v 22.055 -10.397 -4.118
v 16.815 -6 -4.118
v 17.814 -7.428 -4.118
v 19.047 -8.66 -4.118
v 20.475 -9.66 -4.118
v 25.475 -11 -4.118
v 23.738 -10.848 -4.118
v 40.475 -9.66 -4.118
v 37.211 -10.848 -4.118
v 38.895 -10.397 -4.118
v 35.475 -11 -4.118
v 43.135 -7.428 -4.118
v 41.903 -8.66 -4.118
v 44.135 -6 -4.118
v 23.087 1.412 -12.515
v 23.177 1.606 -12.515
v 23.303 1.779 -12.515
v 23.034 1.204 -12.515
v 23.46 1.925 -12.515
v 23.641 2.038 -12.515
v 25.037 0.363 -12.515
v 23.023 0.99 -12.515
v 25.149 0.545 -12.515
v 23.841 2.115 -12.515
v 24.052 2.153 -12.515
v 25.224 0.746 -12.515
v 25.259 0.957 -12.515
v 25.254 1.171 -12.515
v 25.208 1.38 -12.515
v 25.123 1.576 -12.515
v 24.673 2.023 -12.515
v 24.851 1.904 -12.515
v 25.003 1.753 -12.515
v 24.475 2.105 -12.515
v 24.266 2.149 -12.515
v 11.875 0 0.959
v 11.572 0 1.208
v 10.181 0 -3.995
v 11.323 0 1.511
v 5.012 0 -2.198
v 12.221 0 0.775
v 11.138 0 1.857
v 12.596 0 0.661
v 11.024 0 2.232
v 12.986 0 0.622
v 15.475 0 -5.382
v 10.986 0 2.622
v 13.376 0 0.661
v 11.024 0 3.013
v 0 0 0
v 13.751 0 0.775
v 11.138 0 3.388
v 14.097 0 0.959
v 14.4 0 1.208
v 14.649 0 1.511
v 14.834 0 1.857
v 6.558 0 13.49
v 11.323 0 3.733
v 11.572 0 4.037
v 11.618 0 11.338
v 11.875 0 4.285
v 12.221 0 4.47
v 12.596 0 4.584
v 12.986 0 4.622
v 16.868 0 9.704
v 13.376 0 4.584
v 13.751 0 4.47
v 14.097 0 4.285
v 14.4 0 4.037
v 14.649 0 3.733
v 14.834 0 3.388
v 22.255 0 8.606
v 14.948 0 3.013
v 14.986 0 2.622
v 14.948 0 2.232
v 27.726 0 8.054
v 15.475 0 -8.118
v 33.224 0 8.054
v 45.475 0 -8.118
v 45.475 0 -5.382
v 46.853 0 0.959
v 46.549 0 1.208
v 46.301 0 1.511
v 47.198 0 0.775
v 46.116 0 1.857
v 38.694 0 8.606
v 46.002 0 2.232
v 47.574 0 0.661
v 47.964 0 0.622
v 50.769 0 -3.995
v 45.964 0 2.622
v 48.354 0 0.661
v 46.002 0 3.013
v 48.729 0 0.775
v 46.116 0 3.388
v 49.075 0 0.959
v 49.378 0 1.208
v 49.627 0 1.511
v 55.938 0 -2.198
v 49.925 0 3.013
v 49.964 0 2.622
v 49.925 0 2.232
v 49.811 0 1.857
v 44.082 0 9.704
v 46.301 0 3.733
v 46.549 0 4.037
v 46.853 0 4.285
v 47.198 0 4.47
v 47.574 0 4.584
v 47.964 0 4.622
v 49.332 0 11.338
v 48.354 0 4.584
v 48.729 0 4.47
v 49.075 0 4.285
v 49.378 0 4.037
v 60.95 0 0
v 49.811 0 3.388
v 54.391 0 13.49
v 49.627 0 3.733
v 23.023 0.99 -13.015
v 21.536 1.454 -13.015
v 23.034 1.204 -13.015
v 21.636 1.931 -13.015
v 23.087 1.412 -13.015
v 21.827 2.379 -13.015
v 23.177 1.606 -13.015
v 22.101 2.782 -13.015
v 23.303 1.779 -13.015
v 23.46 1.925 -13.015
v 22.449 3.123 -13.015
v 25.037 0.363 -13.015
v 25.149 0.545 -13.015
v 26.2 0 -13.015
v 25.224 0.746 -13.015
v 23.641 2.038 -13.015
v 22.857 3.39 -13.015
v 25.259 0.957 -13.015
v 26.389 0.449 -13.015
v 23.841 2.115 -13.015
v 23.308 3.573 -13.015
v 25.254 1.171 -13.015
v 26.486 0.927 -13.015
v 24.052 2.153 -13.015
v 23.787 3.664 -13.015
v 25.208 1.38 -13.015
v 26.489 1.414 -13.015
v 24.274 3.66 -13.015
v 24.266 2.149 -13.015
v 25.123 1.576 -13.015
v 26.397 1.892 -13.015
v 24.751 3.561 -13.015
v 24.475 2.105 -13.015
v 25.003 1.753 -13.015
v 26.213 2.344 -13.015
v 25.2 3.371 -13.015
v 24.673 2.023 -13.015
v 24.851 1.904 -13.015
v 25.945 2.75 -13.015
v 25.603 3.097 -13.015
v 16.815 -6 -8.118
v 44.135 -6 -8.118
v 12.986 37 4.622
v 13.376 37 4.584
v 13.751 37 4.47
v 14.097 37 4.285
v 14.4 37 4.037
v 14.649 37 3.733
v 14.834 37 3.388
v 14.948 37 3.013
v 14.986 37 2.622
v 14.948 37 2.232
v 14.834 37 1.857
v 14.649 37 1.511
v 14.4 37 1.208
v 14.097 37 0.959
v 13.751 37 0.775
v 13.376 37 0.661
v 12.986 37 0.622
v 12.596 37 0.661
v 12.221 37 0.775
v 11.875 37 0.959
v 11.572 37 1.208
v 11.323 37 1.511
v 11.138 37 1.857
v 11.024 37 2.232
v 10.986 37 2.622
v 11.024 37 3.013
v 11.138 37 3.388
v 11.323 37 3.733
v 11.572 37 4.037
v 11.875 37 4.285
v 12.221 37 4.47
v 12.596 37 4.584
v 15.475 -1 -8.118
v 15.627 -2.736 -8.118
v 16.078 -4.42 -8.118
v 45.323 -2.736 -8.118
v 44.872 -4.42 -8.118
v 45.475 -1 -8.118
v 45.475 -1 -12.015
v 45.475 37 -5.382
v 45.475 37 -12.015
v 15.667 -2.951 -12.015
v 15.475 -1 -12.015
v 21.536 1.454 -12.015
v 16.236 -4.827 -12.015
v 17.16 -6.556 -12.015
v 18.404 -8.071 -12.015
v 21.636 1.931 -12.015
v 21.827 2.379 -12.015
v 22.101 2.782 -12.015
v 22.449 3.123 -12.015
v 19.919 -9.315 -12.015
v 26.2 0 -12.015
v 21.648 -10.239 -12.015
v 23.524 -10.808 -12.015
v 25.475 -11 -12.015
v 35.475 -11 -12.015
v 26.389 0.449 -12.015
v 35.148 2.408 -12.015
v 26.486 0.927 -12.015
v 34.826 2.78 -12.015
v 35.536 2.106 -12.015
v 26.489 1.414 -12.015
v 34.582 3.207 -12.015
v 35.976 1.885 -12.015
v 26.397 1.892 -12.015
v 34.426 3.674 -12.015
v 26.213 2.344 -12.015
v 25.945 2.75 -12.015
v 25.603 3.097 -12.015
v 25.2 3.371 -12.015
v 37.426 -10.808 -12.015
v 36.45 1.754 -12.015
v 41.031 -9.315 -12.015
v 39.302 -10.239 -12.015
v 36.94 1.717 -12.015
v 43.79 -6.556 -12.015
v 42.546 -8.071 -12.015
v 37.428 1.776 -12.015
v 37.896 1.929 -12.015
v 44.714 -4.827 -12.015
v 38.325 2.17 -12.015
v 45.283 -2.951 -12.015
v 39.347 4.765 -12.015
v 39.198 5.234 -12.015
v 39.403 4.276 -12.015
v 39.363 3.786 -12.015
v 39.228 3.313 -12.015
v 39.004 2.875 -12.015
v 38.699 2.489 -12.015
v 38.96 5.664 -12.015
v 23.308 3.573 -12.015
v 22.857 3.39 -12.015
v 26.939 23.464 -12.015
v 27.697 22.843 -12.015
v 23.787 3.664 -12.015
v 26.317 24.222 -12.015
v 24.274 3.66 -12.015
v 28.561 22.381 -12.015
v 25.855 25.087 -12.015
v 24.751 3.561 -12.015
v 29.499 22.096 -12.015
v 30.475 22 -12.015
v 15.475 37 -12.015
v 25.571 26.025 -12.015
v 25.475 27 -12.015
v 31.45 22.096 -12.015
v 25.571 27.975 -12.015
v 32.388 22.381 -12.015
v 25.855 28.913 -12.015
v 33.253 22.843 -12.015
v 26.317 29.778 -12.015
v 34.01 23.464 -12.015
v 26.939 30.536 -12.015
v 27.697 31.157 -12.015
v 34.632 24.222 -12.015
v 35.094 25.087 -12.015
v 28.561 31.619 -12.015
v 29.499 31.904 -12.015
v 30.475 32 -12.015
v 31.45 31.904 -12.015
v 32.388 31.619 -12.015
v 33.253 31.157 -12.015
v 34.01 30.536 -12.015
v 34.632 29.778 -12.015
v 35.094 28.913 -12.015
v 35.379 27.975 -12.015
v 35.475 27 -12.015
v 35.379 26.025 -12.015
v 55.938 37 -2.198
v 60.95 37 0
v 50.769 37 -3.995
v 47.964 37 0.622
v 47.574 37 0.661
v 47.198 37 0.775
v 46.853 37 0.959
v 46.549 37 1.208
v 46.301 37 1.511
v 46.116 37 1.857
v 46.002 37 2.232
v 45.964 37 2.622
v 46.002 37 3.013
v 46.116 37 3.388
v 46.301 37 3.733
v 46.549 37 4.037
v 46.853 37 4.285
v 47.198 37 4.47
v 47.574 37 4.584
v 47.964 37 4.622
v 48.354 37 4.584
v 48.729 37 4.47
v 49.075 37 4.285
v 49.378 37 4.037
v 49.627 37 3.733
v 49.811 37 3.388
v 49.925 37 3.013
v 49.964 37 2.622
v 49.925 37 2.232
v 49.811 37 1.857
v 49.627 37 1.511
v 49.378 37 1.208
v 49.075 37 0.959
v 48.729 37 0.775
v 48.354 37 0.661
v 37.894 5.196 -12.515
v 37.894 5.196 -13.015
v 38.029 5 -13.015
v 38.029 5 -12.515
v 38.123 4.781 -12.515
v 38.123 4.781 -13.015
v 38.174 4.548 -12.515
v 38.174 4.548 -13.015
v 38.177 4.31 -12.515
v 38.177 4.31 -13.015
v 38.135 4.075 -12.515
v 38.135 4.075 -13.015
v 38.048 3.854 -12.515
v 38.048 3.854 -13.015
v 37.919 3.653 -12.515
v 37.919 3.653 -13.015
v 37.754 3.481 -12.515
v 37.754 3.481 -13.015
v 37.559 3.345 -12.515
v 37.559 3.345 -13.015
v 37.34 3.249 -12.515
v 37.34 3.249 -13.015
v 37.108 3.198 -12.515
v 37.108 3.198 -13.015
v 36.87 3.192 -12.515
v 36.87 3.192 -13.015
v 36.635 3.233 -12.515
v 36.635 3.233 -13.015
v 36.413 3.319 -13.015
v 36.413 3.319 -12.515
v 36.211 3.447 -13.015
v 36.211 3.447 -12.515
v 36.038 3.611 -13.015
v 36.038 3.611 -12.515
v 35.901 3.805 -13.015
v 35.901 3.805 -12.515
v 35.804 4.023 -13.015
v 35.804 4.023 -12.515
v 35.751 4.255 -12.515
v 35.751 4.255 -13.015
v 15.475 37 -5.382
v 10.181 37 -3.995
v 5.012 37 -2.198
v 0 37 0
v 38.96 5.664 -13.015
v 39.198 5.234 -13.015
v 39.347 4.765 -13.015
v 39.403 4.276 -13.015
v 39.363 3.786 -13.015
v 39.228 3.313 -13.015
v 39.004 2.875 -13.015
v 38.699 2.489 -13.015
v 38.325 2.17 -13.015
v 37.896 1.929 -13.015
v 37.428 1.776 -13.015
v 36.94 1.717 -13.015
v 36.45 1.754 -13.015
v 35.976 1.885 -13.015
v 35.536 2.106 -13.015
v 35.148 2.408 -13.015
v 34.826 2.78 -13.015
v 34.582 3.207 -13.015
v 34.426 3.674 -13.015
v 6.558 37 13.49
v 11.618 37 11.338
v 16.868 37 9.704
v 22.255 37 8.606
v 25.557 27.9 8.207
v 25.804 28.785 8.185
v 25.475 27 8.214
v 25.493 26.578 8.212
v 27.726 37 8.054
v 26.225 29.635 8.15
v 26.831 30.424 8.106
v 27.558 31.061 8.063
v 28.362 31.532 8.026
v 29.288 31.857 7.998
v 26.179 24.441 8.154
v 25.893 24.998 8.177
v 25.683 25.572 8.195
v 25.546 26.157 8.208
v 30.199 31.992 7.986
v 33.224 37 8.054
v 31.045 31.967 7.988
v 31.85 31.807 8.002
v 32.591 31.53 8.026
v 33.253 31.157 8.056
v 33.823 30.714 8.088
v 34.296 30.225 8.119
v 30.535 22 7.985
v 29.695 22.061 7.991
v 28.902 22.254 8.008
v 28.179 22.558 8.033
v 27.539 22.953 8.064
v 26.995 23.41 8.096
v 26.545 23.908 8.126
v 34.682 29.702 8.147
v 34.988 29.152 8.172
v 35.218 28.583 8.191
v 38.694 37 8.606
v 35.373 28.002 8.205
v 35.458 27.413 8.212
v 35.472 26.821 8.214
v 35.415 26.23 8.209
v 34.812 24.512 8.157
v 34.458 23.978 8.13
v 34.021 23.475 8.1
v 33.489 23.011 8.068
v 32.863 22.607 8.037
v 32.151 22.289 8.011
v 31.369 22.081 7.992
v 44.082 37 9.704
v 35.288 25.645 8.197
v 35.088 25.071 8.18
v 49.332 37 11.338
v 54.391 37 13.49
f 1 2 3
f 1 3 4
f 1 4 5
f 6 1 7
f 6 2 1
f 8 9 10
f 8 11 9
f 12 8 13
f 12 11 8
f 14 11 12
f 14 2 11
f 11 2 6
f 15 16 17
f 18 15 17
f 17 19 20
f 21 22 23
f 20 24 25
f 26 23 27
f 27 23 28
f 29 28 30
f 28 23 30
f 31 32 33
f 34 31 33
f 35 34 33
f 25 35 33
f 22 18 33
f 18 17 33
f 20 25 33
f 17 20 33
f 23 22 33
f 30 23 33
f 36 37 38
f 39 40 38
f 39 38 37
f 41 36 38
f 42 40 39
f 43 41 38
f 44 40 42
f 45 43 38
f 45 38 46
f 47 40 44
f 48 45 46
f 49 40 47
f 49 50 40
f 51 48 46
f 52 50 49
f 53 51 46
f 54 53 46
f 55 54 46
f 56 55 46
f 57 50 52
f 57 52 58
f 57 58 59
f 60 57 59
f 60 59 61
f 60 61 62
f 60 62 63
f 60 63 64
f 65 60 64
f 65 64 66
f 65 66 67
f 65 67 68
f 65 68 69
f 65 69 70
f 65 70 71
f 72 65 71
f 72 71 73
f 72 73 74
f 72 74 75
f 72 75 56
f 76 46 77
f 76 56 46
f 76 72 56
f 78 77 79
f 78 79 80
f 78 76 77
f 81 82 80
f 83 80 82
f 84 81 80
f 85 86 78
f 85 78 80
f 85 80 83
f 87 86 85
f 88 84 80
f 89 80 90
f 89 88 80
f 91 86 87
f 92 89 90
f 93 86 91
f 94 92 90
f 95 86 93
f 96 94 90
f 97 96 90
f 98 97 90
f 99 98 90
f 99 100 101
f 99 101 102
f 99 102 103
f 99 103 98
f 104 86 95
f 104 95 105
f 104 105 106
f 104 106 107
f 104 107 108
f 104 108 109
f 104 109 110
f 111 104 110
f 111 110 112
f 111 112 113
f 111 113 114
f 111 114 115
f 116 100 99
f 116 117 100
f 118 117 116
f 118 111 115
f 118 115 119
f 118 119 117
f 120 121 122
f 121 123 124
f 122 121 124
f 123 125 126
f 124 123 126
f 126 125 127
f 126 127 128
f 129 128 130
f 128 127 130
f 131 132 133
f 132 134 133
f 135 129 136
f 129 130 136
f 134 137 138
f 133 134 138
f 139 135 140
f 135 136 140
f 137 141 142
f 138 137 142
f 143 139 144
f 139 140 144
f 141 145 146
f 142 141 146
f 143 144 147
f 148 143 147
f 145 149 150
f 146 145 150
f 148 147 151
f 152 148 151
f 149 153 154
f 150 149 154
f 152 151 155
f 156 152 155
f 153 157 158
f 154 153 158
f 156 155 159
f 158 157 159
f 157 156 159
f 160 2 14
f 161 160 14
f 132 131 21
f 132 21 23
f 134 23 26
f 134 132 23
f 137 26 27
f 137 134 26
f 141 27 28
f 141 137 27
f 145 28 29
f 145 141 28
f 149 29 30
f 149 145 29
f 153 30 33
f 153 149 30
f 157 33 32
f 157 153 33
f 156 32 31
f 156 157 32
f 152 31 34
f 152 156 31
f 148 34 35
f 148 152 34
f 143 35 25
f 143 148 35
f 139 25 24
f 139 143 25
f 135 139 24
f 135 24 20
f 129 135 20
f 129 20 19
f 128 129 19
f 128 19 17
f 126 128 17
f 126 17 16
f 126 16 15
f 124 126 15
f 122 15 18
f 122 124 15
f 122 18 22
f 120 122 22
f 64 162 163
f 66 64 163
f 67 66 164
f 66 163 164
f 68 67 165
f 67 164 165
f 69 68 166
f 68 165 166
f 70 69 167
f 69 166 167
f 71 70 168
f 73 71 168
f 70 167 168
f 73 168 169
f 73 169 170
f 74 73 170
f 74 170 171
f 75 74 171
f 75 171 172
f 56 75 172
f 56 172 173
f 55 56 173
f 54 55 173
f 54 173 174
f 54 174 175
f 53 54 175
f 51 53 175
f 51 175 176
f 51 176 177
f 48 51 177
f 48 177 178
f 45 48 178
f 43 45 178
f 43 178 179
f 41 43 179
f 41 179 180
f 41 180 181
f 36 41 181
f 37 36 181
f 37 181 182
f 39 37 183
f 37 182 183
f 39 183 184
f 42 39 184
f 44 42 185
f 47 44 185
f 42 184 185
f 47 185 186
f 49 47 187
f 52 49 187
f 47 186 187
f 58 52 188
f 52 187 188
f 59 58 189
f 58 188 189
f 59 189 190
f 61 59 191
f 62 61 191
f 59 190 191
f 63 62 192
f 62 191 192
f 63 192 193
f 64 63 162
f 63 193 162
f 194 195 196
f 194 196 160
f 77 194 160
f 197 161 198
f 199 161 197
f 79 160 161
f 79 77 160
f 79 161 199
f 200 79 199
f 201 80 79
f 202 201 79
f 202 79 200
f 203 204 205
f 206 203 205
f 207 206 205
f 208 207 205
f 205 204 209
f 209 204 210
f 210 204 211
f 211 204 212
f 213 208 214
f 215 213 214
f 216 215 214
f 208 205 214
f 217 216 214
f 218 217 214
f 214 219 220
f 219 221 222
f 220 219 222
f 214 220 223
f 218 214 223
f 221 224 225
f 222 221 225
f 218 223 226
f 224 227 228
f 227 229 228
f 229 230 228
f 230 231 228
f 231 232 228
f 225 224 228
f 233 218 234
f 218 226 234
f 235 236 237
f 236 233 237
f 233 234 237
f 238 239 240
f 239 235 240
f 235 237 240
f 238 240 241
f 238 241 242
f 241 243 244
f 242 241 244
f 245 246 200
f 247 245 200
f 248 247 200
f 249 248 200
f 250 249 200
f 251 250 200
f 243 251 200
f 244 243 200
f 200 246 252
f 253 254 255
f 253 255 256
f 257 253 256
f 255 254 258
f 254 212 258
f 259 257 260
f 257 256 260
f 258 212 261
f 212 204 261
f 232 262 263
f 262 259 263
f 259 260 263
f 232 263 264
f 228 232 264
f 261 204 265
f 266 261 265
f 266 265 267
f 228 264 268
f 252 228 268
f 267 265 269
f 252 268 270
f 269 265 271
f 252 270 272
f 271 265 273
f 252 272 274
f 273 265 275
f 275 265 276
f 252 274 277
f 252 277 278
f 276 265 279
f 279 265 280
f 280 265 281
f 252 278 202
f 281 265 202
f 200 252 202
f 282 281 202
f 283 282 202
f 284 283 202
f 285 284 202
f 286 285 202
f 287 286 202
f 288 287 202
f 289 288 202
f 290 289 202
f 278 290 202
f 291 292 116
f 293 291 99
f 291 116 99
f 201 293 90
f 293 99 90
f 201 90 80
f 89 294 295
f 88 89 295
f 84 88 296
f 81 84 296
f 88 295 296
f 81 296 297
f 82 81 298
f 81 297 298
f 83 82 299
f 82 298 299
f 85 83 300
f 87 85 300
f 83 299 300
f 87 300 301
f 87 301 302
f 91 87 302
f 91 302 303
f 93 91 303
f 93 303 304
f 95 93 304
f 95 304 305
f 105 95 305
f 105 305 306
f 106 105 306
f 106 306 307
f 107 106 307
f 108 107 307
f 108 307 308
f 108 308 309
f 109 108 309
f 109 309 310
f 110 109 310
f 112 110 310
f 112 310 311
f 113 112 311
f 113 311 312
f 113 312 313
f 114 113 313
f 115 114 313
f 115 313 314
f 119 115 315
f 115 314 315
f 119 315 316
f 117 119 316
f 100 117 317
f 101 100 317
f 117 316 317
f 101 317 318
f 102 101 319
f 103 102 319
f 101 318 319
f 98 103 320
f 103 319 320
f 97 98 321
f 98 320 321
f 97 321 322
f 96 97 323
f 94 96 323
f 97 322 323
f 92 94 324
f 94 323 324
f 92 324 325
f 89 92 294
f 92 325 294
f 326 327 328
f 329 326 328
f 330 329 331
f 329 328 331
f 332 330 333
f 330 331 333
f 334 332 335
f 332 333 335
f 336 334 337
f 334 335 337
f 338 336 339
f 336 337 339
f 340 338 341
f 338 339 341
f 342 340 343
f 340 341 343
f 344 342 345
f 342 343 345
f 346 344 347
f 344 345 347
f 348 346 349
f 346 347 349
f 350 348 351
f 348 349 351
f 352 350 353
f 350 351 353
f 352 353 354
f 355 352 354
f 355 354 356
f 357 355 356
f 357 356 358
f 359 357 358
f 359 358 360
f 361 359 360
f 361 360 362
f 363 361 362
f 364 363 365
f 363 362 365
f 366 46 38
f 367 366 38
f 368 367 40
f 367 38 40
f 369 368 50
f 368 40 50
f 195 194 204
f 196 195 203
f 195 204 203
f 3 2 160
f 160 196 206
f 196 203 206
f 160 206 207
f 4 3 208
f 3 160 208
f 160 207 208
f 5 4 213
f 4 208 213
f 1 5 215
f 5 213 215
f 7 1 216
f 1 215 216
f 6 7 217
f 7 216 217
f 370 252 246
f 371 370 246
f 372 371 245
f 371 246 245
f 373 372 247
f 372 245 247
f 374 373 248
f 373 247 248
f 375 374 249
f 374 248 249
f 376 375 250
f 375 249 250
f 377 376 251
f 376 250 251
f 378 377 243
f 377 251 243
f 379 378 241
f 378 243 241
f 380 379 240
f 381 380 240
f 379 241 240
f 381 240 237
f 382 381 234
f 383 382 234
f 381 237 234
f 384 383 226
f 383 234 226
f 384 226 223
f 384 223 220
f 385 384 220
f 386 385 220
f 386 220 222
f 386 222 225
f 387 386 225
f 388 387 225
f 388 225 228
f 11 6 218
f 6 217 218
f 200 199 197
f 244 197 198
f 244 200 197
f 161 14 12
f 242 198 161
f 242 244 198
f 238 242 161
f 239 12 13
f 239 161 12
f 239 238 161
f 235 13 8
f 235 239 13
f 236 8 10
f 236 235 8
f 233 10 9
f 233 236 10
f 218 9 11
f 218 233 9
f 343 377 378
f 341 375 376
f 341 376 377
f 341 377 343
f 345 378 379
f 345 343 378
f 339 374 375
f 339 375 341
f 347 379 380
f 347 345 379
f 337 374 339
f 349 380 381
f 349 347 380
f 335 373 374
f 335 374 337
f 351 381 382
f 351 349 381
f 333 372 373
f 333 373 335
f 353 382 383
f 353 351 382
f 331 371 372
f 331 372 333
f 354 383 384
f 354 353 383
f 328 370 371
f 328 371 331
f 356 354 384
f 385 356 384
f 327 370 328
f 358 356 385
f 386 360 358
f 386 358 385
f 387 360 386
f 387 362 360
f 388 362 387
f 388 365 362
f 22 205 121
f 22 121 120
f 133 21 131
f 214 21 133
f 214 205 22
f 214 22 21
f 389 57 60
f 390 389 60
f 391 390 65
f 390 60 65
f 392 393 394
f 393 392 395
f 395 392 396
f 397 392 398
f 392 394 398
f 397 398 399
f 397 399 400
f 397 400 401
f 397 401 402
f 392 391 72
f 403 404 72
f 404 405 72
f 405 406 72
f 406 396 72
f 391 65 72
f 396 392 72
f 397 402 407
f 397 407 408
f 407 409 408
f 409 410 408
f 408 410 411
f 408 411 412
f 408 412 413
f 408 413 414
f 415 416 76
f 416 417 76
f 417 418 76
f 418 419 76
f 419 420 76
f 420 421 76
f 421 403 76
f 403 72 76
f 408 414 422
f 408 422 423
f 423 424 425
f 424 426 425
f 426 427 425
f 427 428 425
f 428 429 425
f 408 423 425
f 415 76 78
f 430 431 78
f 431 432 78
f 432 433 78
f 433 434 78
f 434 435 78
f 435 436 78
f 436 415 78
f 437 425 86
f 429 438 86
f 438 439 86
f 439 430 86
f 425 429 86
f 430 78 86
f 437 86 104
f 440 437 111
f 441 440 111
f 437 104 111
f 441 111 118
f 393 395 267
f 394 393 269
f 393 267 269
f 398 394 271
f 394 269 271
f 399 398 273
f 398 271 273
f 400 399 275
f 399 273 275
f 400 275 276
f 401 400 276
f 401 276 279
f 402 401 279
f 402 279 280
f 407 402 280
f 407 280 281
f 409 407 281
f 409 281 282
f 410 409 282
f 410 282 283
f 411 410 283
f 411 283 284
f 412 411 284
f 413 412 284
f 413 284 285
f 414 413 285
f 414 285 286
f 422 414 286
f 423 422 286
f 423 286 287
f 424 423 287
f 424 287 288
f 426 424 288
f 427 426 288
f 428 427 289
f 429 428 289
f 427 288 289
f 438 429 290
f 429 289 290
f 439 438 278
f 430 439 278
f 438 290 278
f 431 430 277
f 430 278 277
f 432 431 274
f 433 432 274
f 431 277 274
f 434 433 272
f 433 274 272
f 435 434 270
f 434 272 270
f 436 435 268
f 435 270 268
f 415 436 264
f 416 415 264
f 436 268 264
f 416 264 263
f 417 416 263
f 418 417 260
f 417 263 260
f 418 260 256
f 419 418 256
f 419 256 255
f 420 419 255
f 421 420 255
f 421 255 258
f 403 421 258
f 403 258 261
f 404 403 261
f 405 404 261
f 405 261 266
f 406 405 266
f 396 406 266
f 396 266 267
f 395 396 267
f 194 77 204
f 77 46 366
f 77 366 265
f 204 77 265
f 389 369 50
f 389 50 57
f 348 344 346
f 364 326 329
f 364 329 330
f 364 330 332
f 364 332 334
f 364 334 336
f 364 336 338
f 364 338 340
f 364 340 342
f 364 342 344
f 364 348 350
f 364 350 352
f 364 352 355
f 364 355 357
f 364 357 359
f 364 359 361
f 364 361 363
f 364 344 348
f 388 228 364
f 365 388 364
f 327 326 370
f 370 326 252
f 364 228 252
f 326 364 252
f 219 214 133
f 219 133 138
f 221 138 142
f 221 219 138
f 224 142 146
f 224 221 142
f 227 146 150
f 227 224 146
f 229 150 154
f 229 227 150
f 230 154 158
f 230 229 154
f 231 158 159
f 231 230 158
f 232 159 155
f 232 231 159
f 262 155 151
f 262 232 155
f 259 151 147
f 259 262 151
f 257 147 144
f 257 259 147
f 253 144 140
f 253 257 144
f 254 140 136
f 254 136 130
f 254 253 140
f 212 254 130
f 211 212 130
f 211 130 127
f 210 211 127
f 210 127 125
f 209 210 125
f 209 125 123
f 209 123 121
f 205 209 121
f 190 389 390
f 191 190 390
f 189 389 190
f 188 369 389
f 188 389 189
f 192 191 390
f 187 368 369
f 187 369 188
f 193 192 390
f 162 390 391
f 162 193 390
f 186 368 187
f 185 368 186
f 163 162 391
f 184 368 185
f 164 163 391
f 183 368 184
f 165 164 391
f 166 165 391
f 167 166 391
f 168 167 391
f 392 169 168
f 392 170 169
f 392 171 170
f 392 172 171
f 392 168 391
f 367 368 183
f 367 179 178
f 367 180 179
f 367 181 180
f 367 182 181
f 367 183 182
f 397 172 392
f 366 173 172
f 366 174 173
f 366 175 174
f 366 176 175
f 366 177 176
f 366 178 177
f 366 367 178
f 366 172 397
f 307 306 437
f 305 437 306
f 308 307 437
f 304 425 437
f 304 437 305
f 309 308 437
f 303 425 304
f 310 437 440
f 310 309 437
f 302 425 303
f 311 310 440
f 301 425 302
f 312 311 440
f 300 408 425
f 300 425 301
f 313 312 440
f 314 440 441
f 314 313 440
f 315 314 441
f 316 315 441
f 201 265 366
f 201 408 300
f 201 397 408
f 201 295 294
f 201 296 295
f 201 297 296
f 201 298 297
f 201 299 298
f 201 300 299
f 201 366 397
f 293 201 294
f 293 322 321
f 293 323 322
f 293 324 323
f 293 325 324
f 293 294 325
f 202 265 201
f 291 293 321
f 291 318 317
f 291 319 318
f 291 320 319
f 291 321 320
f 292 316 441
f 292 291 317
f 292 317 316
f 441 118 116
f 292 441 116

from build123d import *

# Parameters (mm, degrees)
BOSS_EXTRUDE1_DEPTH = 37
SKETCH2_R           = 2
CUT_EXTRUDE1_DEPTH  = 73.566185092
SKETCH3_W           = 30
SKETCH3_H           = 7.896551268
BOSS_EXTRUDE2_DEPTH = 48
SKETCH4_W           = 30
SKETCH4_H           = 6
CUT_EXTRUDE2_DEPTH  = 4
FILLET1_R           = 10
SKETCH5_R           = 5
CUT_EXTRUDE3_DEPTH  = 76.725712885
BOSS_EXTRUDE3_DEPTH = 1
CUT_EXTRUDE4_DEPTH  = 0.5


with BuildPart() as part:
    # Sketch1 → Boss-Extrude1 (new body)
    with BuildSketch(Plane(origin=(0, 0, 0), x_dir=(1, 0, 0), z_dir=(0, 1, 0))):
        with BuildLine():
            Line((0, 0), (6.55816832, -13.490382807))
            ThreePointArc((6.55816832, -13.490382807), (30.474828919, -7.985034321), (54.391489518, -13.490382807))
            Line((54.391489518, -13.490382807), (60.949657838, 0))
            ThreePointArc((60.949657838, 0), (30.474828919, 7.014965679), (0, 0))
        make_face()
    extrude(amount=BOSS_EXTRUDE1_DEPTH)

    # Sketch2 → Cut-Extrude1 (cut, through all)
    with BuildSketch(Plane(origin=(0, 37, 0), x_dir=(1, 0, 0), z_dir=(0, 1, 0))):
        with Locations(Location((12.985948873, -2.622359081, 0), (0, 0, 270))):
            Circle(SKETCH2_R)
        with Locations(Location((47.963708964, -2.622359081, 0), (0, 0, 90))):
            Circle(SKETCH2_R)
    extrude(amount=-CUT_EXTRUDE1_DEPTH, mode=Mode.SUBTRACT)

    # Sketch3 → Boss-Extrude2 (add)
    with BuildSketch(Plane(origin=(0, 37, 0), x_dir=(1, 0, 0), z_dir=(0, 1, 0))):
        with Locations((30.474828919, 8.066690045)):
            Rectangle(SKETCH3_W, SKETCH3_H)
    extrude(amount=-BOSS_EXTRUDE2_DEPTH)

    # Sketch4 → Cut-Extrude2 (cut)
    with BuildSketch(Plane.XY.offset(-4.118414411)):
        with Locations((30.474828919, -3)):
            Rectangle(SKETCH4_W, SKETCH4_H)
    extrude(amount=-CUT_EXTRUDE2_DEPTH, mode=Mode.SUBTRACT)

    # Fillet1
    fillet1_edges = [part.edges().sort_by_distance(p)[0] for p in [
        (15.474828919, -11, -8.066690045),
        (45.474828919, -11, -8.066690045),
    ]]
    fillet(fillet1_edges, radius=FILLET1_R)

    # Sketch5 → Cut-Extrude3 (cut, through all)
    with BuildSketch(Plane(origin=(0, 0, -12.014965679), x_dir=(-1, 0, 0), z_dir=(0, 0, -1))):
        with Locations((-30.474828919, 27)):
            Circle(SKETCH5_R)
    extrude(amount=-CUT_EXTRUDE3_DEPTH, mode=Mode.SUBTRACT)

    # Sketch7 → Boss-Extrude3 (add)
    with BuildSketch(Plane(origin=(0, 0, -12.014965679), x_dir=(-1, 0, 0), z_dir=(0, 0, -1))):
        with BuildLine():
            Line((-21.536068007, 1.453872129), (-26.199769352, 0))
            ThreePointArc((-26.199769352, 0), (-24.751375622, 3.560871216), (-21.536068007, 1.453872129))
        make_face()
        with BuildLine():
            Line((-34.426020337, 3.673663851), (-38.960174422, 5.664158065))
            ThreePointArc((-38.960174422, 5.664158065), (-37.895872331, 1.929105477), (-34.426020337, 3.673663851))
        make_face()
    extrude(amount=BOSS_EXTRUDE3_DEPTH)

    # Sketch8 → Cut-Extrude4 (cut)
    with BuildSketch(Plane(origin=(0, 0, -13.014965679), x_dir=(-1, 0, 0), z_dir=(0, 0, -1))):
        with BuildLine():
            Line((-23.022731531, 0.990416495), (-25.036897729, 0.362516061))
            ThreePointArc((-25.036897729, 0.362516061), (-24.475304572, 2.105499822), (-23.022731531, 0.990416495))
        make_face()
        with BuildLine():
            Line((-35.750767501, 4.255228023), (-37.89390211, 5.196064386))
            ThreePointArc((-37.89390211, 5.196064386), (-37.451768412, 3.29185708), (-35.750767501, 4.255228023))
        make_face()
    extrude(amount=-CUT_EXTRUDE4_DEPTH, mode=Mode.SUBTRACT)


solid = part.part
